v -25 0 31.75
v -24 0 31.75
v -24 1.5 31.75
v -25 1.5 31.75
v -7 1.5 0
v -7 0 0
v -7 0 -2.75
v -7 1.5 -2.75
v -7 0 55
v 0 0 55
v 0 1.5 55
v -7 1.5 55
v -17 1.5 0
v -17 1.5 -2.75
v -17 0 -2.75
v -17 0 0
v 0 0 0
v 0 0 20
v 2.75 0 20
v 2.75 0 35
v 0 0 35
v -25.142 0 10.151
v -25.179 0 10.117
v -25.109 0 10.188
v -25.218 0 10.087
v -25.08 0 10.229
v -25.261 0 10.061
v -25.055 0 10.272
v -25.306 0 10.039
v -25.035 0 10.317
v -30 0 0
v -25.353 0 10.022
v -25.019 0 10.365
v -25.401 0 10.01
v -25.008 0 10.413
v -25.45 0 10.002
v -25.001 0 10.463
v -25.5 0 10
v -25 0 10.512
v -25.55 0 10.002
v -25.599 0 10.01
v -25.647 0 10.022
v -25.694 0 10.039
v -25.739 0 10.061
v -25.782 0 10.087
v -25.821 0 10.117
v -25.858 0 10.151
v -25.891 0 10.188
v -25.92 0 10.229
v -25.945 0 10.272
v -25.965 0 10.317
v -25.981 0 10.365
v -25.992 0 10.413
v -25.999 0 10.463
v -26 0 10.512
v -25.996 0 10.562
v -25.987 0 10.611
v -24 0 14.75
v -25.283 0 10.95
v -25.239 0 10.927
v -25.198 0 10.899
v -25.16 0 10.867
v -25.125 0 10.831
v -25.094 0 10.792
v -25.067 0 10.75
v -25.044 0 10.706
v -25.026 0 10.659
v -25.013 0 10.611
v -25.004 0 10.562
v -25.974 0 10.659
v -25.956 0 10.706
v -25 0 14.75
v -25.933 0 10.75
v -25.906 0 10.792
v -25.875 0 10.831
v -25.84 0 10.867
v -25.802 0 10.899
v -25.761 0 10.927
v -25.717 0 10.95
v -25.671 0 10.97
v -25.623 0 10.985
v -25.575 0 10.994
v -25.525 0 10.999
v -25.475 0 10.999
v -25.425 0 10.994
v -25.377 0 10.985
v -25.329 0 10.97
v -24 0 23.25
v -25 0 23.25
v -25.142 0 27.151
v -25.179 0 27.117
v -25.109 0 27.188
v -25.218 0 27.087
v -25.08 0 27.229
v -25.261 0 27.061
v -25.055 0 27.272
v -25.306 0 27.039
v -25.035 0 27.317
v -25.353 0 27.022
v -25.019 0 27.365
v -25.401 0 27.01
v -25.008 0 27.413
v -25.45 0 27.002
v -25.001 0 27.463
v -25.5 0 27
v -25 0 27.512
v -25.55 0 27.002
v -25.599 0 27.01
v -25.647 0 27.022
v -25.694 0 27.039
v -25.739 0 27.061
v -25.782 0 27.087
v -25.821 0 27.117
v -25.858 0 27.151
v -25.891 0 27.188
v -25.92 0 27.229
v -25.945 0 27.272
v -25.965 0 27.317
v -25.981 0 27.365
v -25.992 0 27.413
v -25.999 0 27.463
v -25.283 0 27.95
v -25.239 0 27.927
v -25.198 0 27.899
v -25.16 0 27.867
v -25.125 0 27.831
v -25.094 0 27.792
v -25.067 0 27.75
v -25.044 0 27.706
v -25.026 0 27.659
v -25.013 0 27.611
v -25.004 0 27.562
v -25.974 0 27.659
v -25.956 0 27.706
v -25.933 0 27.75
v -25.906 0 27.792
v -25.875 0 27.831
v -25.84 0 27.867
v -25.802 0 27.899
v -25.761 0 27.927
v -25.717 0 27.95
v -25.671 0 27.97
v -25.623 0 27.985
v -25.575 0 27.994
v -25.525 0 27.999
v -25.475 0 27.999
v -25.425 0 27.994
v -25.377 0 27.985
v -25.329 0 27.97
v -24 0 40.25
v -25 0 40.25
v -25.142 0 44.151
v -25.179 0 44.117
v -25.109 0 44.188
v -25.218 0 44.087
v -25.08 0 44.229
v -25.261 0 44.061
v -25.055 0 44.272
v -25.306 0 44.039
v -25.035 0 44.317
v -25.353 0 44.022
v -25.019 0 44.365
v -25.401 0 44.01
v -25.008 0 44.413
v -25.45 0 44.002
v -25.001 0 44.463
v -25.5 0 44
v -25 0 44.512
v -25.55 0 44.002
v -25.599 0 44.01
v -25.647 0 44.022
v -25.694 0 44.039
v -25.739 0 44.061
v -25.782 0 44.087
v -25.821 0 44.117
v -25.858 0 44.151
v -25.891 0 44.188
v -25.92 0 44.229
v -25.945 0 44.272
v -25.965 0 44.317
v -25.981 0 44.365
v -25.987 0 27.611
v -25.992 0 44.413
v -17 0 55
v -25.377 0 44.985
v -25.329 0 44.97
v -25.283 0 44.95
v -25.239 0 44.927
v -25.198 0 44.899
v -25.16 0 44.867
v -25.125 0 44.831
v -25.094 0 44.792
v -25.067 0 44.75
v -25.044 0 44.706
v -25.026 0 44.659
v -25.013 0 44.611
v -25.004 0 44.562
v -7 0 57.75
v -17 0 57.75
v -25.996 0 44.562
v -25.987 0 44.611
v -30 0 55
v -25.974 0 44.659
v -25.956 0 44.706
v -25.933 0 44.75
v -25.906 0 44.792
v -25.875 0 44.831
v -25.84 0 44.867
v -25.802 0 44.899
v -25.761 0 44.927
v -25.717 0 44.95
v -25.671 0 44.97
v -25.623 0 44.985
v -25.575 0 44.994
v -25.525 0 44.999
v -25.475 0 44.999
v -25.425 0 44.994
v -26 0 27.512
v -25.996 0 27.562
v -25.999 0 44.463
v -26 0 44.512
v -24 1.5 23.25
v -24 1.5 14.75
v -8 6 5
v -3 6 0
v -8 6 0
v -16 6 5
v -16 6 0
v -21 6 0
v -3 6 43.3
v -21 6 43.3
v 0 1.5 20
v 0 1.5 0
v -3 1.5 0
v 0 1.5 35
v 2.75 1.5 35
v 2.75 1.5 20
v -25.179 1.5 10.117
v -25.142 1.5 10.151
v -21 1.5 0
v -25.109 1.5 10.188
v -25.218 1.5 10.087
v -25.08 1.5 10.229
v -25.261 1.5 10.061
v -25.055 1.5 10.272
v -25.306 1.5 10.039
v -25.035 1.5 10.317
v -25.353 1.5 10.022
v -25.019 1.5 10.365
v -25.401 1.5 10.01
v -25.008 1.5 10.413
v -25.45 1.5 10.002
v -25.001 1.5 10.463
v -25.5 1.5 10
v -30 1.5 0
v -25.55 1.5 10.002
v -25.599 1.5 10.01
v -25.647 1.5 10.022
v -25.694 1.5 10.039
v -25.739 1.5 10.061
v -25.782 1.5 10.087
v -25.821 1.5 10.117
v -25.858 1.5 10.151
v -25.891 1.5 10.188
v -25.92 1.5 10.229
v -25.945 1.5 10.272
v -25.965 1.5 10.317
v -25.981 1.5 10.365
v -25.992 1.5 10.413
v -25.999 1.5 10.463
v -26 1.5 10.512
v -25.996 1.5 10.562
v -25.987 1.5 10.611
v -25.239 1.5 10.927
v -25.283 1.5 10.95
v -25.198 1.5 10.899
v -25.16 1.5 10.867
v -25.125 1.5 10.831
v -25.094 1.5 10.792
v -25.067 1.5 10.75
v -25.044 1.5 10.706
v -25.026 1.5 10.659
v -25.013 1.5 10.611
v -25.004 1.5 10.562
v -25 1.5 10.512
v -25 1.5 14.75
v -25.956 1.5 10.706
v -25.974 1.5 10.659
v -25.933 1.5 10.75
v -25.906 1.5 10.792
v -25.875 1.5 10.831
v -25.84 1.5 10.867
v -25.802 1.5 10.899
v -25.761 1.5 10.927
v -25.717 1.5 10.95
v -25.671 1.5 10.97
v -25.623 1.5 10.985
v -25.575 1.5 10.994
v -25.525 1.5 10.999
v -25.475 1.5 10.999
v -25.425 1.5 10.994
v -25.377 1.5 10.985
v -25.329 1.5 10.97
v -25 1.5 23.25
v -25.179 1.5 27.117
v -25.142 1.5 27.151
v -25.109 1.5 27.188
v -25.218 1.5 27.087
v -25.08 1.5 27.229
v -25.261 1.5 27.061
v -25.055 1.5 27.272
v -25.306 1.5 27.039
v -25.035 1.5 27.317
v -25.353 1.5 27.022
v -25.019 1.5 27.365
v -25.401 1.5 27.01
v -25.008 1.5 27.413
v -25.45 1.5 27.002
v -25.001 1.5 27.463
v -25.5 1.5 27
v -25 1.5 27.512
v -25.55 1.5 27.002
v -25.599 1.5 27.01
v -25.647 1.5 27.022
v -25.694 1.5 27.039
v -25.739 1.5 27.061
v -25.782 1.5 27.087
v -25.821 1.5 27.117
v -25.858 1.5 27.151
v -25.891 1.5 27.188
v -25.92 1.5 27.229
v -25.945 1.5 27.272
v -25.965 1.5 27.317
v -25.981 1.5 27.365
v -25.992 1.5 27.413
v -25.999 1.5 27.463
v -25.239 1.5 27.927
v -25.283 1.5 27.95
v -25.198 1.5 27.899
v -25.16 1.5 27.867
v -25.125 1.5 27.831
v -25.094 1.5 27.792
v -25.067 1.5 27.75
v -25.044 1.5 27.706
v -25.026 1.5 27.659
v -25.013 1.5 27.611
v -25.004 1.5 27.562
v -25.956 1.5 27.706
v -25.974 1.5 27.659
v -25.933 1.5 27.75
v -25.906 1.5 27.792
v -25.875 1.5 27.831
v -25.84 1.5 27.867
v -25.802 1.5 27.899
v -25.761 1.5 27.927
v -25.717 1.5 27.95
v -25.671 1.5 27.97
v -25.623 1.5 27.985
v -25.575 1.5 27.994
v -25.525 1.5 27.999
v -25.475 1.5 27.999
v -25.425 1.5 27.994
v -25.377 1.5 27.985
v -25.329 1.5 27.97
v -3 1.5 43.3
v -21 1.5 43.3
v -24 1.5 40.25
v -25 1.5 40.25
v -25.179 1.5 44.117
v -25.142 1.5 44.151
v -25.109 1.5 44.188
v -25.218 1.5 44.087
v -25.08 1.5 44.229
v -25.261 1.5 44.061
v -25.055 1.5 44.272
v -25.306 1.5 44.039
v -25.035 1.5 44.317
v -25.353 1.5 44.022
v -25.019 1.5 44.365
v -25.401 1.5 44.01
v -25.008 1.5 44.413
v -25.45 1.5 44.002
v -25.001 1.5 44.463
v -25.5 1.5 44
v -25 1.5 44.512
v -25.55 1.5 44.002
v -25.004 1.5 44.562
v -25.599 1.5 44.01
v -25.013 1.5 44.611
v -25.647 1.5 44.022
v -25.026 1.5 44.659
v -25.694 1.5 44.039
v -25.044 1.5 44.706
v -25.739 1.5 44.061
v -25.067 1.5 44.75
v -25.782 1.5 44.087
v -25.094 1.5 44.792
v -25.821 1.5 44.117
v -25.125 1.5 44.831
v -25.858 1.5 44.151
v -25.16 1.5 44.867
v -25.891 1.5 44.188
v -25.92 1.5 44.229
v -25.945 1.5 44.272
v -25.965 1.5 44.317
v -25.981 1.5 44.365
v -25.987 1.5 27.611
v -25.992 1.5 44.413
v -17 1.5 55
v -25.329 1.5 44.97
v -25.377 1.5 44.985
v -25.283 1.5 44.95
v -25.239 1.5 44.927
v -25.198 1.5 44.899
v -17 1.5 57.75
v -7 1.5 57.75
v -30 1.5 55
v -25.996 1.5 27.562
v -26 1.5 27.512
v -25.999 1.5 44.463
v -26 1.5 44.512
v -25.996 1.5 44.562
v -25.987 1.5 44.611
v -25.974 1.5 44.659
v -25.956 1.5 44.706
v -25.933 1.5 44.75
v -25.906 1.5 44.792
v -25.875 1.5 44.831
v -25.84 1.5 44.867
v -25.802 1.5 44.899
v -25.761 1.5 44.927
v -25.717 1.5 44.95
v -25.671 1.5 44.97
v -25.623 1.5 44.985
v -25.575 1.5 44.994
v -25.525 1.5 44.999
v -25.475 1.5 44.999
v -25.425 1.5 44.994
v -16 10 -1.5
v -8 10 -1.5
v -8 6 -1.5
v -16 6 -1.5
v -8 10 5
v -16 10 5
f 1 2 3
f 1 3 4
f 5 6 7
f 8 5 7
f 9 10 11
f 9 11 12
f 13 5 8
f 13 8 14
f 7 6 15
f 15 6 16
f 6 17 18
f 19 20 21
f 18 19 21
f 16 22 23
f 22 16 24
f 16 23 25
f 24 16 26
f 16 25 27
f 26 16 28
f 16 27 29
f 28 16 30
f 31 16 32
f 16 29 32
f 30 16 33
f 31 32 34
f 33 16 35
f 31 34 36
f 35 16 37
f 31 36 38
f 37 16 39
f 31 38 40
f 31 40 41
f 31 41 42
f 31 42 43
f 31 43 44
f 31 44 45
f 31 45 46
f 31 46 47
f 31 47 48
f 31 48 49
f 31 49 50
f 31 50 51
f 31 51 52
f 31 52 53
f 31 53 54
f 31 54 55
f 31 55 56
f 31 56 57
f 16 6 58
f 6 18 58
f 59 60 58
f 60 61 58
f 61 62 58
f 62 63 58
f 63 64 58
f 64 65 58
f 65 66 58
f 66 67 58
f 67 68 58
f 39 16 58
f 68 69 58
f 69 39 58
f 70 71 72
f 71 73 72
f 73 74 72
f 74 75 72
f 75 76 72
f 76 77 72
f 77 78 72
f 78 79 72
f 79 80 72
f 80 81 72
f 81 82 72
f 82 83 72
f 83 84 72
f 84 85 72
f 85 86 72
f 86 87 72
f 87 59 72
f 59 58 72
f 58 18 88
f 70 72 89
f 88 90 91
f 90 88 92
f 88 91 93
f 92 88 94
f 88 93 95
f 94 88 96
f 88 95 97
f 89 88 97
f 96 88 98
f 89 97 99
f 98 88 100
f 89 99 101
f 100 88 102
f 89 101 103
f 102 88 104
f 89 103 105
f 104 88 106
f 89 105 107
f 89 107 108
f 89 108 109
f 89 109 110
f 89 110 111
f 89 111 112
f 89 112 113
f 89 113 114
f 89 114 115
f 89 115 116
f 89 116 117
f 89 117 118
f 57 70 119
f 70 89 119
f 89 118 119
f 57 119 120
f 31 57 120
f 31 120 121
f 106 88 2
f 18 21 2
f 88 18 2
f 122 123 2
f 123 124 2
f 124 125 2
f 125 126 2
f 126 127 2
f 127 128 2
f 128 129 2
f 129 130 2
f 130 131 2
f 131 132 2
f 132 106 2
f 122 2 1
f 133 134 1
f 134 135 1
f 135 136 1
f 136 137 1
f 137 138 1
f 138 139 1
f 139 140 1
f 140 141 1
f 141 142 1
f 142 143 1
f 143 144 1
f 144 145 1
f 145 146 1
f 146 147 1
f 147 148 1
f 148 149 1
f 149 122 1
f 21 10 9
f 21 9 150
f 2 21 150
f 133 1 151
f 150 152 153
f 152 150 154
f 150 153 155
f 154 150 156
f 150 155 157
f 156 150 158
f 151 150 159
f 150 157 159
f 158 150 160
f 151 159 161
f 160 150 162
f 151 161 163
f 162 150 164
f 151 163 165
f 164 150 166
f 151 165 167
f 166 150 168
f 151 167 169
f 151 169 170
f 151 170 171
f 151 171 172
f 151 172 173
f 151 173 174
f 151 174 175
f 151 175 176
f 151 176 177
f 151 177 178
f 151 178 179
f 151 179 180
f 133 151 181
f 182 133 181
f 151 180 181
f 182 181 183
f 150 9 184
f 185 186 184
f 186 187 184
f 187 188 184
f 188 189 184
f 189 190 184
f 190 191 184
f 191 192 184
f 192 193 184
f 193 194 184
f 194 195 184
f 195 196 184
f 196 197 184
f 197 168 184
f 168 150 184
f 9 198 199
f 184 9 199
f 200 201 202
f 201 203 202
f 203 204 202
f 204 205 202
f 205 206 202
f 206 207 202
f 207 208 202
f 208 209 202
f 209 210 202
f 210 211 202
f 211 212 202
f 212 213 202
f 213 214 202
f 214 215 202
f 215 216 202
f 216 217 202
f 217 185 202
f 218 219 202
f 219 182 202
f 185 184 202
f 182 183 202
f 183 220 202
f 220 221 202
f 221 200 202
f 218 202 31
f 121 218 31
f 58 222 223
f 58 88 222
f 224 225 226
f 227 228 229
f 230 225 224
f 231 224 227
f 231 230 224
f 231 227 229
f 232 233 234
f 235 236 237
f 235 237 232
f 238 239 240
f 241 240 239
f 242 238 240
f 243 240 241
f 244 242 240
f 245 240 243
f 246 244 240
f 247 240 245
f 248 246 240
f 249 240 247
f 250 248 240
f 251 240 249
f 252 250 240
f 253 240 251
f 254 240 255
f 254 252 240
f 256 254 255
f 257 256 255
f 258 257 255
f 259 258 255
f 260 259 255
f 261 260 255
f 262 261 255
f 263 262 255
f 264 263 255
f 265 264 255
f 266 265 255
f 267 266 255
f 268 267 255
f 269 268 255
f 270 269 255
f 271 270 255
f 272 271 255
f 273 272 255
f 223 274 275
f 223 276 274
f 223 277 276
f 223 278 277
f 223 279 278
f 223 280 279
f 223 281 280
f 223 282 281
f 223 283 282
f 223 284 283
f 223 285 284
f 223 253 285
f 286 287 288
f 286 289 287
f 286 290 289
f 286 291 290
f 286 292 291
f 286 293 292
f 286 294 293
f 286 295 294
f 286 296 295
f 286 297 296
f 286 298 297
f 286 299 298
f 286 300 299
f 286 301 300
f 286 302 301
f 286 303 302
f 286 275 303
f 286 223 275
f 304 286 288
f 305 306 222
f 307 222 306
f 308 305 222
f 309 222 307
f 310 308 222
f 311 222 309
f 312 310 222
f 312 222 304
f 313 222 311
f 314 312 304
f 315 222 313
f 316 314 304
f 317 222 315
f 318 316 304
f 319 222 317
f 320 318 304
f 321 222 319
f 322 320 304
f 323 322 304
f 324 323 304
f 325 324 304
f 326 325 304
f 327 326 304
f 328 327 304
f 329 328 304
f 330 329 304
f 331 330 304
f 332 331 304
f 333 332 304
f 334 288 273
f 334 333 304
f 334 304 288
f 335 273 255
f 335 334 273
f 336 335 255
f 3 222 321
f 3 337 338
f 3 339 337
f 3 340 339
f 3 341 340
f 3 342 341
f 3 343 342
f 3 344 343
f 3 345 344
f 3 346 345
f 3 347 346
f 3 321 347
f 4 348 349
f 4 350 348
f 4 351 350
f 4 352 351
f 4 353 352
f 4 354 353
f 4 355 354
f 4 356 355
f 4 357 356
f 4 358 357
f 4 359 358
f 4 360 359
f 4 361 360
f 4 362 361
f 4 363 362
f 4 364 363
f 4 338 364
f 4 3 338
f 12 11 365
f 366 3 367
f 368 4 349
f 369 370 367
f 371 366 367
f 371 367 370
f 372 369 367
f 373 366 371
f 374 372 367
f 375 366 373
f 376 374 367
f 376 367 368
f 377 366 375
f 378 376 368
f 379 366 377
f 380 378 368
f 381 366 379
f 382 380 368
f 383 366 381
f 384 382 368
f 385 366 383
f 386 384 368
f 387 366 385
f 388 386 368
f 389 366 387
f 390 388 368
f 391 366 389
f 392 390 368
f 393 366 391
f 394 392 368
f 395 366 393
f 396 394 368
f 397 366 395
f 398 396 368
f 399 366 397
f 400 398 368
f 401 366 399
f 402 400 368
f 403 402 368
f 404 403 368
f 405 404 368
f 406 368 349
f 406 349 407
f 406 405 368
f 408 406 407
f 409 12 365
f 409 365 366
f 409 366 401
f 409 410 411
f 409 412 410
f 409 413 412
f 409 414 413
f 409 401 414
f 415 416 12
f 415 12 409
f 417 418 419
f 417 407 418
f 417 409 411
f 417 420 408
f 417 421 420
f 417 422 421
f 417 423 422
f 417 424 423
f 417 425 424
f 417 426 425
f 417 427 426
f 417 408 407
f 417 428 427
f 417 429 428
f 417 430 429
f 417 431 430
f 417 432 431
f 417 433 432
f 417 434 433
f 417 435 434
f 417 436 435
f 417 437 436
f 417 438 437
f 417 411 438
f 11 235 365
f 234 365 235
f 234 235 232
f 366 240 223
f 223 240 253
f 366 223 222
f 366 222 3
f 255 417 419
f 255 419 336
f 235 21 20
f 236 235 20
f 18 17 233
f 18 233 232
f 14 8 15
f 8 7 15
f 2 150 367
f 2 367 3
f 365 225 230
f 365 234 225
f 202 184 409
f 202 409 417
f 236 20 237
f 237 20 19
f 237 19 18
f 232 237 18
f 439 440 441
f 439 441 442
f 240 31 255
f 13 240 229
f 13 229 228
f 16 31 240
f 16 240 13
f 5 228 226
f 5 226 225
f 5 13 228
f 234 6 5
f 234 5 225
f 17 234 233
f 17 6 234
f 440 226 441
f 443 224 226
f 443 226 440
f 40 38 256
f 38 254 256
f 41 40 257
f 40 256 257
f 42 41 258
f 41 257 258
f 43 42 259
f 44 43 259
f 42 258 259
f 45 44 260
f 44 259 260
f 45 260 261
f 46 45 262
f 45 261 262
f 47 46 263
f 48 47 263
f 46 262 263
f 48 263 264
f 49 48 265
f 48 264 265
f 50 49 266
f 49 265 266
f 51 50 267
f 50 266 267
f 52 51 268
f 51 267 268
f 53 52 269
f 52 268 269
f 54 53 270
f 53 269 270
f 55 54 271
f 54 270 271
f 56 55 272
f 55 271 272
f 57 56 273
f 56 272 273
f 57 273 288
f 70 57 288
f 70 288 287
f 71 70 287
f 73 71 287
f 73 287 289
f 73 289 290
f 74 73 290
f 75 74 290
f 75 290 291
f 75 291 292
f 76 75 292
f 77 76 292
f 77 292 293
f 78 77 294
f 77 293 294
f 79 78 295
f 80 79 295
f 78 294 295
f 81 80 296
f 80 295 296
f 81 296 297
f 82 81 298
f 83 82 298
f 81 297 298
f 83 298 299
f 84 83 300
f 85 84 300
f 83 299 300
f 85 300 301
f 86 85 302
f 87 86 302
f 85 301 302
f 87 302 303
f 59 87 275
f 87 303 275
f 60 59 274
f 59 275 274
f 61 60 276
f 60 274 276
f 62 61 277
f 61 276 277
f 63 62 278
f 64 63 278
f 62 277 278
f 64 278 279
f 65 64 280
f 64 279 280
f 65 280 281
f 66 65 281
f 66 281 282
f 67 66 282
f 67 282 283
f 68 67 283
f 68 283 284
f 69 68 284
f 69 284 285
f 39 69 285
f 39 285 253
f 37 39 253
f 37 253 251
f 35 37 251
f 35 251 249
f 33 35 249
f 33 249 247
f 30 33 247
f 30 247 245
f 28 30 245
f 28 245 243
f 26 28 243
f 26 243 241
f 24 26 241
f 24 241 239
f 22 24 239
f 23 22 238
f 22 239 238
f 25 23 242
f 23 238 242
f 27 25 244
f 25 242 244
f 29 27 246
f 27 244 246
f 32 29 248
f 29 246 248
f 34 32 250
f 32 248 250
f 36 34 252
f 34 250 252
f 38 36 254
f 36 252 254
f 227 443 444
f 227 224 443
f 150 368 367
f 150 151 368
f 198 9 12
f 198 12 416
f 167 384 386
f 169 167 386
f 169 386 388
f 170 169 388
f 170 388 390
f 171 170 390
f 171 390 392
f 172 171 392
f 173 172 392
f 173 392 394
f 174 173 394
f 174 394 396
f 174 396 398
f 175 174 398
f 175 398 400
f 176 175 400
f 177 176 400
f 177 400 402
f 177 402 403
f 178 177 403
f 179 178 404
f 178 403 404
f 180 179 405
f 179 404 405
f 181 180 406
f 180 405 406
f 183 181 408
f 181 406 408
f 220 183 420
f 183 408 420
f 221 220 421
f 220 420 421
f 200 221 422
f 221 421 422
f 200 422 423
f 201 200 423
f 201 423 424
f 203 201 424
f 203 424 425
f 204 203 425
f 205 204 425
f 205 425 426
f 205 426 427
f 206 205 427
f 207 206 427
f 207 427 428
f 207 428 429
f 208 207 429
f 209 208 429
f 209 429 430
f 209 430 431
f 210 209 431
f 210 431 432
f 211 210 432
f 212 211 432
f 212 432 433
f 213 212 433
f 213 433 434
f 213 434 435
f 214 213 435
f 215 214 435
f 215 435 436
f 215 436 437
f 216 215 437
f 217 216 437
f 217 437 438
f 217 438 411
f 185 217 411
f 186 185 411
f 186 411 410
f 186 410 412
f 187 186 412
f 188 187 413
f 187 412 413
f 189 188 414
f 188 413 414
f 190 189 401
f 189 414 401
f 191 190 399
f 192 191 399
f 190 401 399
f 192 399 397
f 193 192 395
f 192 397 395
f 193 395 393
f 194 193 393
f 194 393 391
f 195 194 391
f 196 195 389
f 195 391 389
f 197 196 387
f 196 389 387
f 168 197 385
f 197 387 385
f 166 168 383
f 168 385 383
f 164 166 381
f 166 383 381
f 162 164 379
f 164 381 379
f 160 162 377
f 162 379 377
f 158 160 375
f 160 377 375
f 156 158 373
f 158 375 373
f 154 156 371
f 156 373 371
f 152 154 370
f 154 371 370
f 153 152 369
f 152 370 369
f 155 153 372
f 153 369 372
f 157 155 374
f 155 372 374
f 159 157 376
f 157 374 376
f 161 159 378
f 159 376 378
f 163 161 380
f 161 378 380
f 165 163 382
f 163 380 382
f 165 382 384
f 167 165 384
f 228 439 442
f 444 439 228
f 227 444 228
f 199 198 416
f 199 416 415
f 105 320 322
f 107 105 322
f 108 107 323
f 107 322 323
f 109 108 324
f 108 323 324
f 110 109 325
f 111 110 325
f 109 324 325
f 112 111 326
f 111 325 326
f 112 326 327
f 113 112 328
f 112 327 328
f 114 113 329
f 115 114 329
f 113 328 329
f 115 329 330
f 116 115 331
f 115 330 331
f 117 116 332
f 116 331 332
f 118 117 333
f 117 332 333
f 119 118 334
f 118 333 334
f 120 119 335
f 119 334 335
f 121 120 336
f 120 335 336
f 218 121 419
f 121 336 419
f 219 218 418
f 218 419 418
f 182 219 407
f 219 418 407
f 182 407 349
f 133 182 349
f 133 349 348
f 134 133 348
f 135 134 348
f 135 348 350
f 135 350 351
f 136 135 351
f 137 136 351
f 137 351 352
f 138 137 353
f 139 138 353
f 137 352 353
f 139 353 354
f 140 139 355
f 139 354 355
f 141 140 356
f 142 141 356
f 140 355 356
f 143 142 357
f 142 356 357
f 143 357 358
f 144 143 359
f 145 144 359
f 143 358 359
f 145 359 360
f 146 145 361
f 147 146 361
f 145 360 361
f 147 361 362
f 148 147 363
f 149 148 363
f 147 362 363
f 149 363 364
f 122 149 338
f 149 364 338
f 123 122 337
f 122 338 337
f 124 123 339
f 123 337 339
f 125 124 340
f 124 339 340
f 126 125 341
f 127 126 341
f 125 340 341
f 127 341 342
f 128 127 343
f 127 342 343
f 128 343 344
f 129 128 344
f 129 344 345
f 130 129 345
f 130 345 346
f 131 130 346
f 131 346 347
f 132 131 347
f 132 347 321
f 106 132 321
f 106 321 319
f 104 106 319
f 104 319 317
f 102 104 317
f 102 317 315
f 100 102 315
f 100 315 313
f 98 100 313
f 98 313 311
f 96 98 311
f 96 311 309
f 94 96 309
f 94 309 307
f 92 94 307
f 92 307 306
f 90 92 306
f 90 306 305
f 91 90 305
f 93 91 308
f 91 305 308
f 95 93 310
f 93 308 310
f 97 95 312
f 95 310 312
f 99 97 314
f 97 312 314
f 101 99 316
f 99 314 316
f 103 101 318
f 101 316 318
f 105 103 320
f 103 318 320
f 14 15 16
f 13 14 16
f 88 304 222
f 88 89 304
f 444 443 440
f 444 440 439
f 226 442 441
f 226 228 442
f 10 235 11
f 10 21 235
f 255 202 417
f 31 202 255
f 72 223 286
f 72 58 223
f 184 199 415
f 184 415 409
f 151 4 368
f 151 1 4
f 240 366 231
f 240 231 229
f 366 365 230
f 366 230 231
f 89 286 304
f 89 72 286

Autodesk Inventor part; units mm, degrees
ref_plane "YZ Plane" through (0, 0, 0) normal (1, 0, 0) x (0, 1, 0)
ref_plane "XZ Plane" through (0, 0, 0) normal (0, 1, 0) x (-1, 0, 0)
ref_plane "XY Plane" through (0, 0, 0) normal (0, 0, 1) x (1, 0, 0)
sketch "Sketch1" plane through (0, 0, 0) normal (0, 1, 0) x (-1, 0, 0)
  line L0 (30, 0) -> (0, 0)
  line L1 (3, 0) -> (3, 43.3)
  line L2 (3, 43.3) -> (21, 43.3)
  line L3 (21, 43.3) -> (21, 0)
  line L4 (15, -19.2684) -> (15, 39.5149) construction
  line L5 (8, 5) -> (16, 5)
  line L6 (16, 5) -> (16, 0)
  line L7 (8, 0) -> (8, 5)
  line L8 (7, 55) -> (7, 57.75)
  line L9 (7, 57.75) -> (17, 57.75)
  line L10 (17, 57.75) -> (17, 55)
  line L11 (0, 55) -> (7, 55)
  line L12 (17, 55) -> (30, 55)
  line L13 (0, 0) -> (0, 55)
  line L14 (30, 55) -> (30, 0)
  line L15 (7, 0) -> (7, -2.75)
  line L16 (7, -2.75) -> (17, -2.75)
  line L17 (17, -2.75) -> (17, 0)
  line L18 (0, 35) -> (-2.75, 35)
  line L19 (-2.75, 35) -> (-2.75, 20)
  line L20 (-2.75, 20) -> (0, 20)
  line L21 (25, 14.75) -> (25, 23.25)
  line L22 (25, 23.25) -> (24, 23.25)
  line L23 (24, 23.25) -> (24, 14.75)
  line L24 (24, 14.75) -> (25, 14.75)
  line L25 (24, 31.75) -> (25, 31.75)
  line L26 (25, 31.75) -> (25, 40.25)
  line L27 (25, 40.25) -> (24, 40.25)
  line L28 (24, 40.25) -> (24, 31.75)
  line L29 (12, 13) -> (12, 28.6373) construction
  point P0 (0, 0)
  point P1 (0, 0)
  point P2 (0, 0)
  point P3 (0, 0)
  point P4 (25.5, 44.5)
  point P5 (25.5, 27.5)
  point P6 (25.5, 10.5)
  dimension "d47" = 18
  dimension "d49" = 43.3
  dimension "d50" = 5
  dimension "d51" = 8
  dimension "d52" = 30
  dimension "d53" = 55
  dimension "d123" = 10
  dimension "d126" = 2.75
  dimension "d134" = 10
  dimension "d136" = 2.75
  dimension "d146" = 2.75
  dimension "d151" = 8.5
  dimension "d153" = 1
  dimension "d155" = 5
  dimension "d156" = 3
  dimension "d157" = 7
  dimension "d158" = 10.5
  dimension "d159" = 17
  dimension "d160" = 17
  dimension "d161" = 4.25
  dimension "d162" = 4.25
  dimension "d171" = 13
  dimension "d172" = 7
  dimension "d173" = 20
  dimension "d174" = 20
  dimension "d175" = 15
  dimension "d176" = 4.5
extrude "Extrusion1" add sketch "Sketch1" along normal blind 1.5
extrude "Extrusion2" add sketch "Sketch1" along normal blind 6 contours L0 L6 L5 L7 L1 L2 L3 | L0 L7 L5 L6
sketch "Sketch2" plane through (0, 0, 0) normal (0, 0, -1) x (-1, 0, 0)
  line L0 (8, 10) -> (16, 10)
  line L1 (16, 10) -> (16, 6)
  line L2 (16, 6) -> (8, 6)
  line L3 (8, 6) -> (8, 10)
  line L4 (0, 0) -> (7, 0) projected
  line L5 (16, 6) -> (16, 10)
  line L6 (12, 9) -> (12, -2.5232) construction
  line L7 (3, 1.5) -> (3, 6) projected
  line L8 (7, 1.5) -> (17, 1.5) projected
  point P0 (30, 0)
  point P1 (21.75, 6)
  point P2 (12, 1.5)
  dimension "d100" = 4
  dimension "d101" = 8
extrude "Extrusion7" add sketch "Sketch2" along normal blind 1.5
extrude "Extrusion9" cut sketch "Sketch1" along normal blind 10 contours L0 L7 L5 L6
extrude "Extrusion10" add sketch "Sketch1" along normal blind 10 contours L0 L7 L5 L6
hole "Hole1" at (-25.5, 0, 44.5) at (-25.5, 0, 27.5) at (-25.5, 0, 10.5) direction (0, 1, 0) diameter 1 end through all
properties part number "Motherboard_dummy" material "ABS Plastic"
